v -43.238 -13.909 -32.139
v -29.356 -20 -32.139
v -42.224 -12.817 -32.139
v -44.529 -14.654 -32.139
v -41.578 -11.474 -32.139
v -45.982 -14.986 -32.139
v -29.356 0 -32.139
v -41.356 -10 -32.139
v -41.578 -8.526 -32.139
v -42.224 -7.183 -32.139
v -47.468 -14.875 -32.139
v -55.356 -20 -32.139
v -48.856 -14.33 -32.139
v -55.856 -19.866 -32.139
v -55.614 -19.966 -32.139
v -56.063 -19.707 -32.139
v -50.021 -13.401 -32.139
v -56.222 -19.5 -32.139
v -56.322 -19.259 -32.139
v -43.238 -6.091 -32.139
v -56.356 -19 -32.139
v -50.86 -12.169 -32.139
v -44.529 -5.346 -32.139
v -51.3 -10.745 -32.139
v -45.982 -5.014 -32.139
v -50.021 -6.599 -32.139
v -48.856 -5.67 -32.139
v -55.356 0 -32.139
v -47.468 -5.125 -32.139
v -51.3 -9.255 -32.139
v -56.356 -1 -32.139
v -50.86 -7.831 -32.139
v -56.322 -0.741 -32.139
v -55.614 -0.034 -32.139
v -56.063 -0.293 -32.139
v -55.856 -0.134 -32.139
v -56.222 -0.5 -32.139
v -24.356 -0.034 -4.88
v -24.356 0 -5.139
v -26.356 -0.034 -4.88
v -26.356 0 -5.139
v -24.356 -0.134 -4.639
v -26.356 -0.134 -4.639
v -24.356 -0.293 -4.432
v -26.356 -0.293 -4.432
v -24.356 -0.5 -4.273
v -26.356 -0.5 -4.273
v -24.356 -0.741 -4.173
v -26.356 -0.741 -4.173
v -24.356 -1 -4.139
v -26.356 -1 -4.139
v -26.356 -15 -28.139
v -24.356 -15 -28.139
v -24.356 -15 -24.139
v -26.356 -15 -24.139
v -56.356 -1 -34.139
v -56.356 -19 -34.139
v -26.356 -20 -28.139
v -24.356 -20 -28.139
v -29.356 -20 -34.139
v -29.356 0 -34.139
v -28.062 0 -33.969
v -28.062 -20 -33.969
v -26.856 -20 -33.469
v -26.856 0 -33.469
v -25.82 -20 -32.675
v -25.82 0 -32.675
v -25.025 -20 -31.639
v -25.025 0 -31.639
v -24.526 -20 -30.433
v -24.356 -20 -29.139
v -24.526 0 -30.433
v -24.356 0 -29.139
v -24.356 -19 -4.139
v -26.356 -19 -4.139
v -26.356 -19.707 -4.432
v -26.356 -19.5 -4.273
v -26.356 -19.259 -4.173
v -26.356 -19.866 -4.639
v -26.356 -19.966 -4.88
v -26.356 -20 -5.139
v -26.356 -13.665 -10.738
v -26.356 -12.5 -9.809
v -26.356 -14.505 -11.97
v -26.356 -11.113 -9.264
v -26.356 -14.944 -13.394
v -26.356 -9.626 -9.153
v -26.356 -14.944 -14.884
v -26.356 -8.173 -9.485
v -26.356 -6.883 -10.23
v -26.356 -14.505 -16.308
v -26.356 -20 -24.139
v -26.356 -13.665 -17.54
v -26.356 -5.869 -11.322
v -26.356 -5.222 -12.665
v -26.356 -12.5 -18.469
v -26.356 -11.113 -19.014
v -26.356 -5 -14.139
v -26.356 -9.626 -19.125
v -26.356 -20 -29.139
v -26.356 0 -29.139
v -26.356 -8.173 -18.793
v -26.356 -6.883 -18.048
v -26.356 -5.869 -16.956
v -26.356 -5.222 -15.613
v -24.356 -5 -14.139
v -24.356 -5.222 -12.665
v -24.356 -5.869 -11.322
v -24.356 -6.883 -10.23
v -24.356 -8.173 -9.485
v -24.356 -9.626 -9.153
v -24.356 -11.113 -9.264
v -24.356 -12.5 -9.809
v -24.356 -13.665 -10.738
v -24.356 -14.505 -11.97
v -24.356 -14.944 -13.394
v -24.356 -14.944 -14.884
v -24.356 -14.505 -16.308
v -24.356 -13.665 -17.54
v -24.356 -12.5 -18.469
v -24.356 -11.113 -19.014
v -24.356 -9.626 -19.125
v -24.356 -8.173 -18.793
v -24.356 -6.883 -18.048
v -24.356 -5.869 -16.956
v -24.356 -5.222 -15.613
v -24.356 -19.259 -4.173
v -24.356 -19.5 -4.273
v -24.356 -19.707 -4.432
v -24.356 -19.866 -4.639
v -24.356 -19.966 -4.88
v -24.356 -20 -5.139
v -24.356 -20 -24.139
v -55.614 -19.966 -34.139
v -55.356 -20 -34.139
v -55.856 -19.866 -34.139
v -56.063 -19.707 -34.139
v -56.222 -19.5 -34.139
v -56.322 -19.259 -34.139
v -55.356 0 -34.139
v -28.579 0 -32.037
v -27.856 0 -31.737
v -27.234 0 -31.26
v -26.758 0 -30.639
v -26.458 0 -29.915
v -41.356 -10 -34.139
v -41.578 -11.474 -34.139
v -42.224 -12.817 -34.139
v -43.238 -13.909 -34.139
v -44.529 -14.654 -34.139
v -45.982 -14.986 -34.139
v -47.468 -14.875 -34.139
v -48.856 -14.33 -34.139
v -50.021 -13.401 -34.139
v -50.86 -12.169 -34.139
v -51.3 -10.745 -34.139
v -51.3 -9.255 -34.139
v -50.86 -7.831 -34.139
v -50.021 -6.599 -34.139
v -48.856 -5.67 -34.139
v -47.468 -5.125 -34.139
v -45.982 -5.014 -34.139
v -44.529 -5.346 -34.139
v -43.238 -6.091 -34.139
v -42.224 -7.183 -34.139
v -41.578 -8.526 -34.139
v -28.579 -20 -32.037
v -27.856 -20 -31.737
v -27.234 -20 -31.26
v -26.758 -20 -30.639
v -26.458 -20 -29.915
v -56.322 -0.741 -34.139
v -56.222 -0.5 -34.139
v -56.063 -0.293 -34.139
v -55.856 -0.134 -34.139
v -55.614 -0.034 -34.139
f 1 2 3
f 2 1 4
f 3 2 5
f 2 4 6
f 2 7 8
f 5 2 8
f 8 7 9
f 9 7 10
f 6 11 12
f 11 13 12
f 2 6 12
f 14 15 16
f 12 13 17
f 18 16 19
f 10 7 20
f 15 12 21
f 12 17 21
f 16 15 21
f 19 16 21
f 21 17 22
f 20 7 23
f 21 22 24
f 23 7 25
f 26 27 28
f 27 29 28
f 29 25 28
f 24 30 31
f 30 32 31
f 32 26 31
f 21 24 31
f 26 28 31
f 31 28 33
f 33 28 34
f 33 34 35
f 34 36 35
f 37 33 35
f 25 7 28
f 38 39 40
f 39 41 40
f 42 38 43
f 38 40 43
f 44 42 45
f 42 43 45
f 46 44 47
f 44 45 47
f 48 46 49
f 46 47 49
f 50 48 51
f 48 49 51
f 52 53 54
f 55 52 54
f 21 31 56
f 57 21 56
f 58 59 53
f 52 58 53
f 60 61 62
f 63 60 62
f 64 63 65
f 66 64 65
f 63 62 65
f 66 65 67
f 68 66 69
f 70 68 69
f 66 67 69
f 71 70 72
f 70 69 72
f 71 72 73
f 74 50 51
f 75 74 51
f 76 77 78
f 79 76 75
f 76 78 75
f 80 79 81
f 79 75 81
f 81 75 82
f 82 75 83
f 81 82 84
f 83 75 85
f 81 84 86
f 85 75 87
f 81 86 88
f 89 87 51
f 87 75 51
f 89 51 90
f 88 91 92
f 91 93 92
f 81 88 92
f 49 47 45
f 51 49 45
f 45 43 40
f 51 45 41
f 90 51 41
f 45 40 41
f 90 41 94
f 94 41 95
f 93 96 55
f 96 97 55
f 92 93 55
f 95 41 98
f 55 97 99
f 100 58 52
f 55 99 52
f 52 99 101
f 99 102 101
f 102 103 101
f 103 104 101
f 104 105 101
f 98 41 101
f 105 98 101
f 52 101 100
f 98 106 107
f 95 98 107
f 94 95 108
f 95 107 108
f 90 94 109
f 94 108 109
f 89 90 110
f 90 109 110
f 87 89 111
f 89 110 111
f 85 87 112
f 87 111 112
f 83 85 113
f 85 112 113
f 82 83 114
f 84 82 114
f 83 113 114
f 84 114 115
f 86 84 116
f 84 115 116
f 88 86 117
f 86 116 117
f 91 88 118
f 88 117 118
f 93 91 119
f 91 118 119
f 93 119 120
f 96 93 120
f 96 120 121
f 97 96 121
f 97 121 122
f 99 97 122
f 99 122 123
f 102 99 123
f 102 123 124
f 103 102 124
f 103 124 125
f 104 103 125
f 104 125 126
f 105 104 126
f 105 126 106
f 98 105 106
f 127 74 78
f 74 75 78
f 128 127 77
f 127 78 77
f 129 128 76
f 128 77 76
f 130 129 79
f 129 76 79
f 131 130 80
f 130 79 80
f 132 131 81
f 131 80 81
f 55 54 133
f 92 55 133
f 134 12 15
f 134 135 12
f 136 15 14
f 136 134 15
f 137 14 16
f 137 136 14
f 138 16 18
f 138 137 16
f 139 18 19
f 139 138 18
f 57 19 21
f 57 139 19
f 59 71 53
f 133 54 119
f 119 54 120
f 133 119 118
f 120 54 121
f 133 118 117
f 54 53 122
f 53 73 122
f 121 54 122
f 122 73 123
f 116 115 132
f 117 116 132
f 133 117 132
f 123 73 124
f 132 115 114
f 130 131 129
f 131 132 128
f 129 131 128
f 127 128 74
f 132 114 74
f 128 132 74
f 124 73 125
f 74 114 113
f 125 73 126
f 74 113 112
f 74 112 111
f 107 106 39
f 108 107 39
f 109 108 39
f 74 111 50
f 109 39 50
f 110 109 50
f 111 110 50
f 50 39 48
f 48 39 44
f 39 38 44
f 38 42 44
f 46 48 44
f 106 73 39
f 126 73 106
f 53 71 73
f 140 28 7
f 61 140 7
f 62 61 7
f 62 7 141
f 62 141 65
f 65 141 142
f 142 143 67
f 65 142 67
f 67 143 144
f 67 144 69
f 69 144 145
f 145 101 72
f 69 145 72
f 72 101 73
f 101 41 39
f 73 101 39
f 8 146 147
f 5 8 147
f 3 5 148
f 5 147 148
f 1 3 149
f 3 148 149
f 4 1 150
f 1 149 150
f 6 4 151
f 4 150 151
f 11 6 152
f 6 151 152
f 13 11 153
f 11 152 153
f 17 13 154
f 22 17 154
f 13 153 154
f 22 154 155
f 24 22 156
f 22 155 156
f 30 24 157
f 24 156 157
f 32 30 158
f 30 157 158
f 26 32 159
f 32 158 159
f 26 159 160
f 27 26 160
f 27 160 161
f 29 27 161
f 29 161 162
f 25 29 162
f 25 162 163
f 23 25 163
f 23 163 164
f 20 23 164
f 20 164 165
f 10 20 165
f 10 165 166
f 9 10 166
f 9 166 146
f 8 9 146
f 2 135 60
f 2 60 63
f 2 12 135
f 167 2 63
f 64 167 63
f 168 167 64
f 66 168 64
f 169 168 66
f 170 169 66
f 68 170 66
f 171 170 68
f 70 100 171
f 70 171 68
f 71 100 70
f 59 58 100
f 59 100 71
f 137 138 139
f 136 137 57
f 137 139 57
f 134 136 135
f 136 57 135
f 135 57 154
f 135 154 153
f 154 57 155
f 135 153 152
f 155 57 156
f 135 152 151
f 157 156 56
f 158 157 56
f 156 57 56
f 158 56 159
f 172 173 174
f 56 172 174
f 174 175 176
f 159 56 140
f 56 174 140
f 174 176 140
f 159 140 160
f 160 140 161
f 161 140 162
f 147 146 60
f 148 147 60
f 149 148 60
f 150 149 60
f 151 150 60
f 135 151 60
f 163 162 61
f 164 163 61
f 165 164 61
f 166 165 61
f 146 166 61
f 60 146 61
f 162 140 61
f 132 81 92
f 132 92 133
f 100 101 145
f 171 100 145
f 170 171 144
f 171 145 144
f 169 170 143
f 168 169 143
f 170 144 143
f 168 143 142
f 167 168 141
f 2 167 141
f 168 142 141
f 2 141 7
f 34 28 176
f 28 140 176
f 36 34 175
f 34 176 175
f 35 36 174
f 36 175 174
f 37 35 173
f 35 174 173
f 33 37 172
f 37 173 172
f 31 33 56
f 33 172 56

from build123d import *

# Parameters (mm, degrees)
F1_DEPTH = 20
F3_DEPTH = 3
F4_R     = 5
F5_DEPTH = 3
F6_R     = 5
F7_DEPTH = 3
F8_R     = 1


with BuildPart() as f1:
    # F0 (on Front) → F1 (new body)
    with BuildSketch(Plane.XZ):
        with BuildLine():
            Line((-29.355609, -32.139022), (-56.355609, -32.139022))
            Line((-56.355609, -32.139022), (-56.355609, -34.139022))
            Line((-56.355609, -34.139022), (-29.355609, -34.139022))
            ThreePointArc((-29.355609, -34.139022), (-25.820076, -32.674556), (-24.355609, -29.139022))
            Line((-24.355609, -29.139022), (-24.355609, -4.139022))
            Line((-24.355609, -4.139022), (-26.355609, -4.139022))
            Line((-26.355609, -4.139022), (-26.355609, -29.139022))
            ThreePointArc((-26.355609, -29.139022), (-27.234289, -31.260342), (-29.355609, -32.139022))
        make_face()
    extrude(amount=F1_DEPTH)

    # F2 (on face) → F3 (cut)
    with BuildSketch(Plane.YZ.offset(-24.355609)):
        Polygon((-17.18655, -24.139022), (-20, -24.139022), (-20, -28.139022), (-15, -28.139022), (-15, -24.139022), align=None)
    extrude(amount=-F3_DEPTH, mode=Mode.SUBTRACT)

    # F4 (on face) → F5 (cut)
    with BuildSketch(Plane.YZ.offset(-24.355609)):
        with Locations((-10, -14.139022)):
            Circle(F4_R)
    extrude(amount=-F5_DEPTH, mode=Mode.SUBTRACT)

    # F6 (on face) → F7 (cut)
    with BuildSketch(Plane(origin=(0, 0, -34.139022), x_dir=(1, 0, 0), z_dir=(0, 0, -1))):
        with Locations((-46.355609, 10)):
            Circle(F6_R)
    extrude(amount=-F7_DEPTH, mode=Mode.SUBTRACT)

    # F8
    f8_edges = [f1.edges().sort_by_distance(p)[0] for p in [
        (-25.355609, -20, -4.139022),
        (-25.355609, 0, -4.139022),
        (-56.355609, -20, -33.139022),
        (-56.355609, 0, -33.139022),
    ]]
    fillet(f8_edges, radius=F8_R)


solid = f1.part
